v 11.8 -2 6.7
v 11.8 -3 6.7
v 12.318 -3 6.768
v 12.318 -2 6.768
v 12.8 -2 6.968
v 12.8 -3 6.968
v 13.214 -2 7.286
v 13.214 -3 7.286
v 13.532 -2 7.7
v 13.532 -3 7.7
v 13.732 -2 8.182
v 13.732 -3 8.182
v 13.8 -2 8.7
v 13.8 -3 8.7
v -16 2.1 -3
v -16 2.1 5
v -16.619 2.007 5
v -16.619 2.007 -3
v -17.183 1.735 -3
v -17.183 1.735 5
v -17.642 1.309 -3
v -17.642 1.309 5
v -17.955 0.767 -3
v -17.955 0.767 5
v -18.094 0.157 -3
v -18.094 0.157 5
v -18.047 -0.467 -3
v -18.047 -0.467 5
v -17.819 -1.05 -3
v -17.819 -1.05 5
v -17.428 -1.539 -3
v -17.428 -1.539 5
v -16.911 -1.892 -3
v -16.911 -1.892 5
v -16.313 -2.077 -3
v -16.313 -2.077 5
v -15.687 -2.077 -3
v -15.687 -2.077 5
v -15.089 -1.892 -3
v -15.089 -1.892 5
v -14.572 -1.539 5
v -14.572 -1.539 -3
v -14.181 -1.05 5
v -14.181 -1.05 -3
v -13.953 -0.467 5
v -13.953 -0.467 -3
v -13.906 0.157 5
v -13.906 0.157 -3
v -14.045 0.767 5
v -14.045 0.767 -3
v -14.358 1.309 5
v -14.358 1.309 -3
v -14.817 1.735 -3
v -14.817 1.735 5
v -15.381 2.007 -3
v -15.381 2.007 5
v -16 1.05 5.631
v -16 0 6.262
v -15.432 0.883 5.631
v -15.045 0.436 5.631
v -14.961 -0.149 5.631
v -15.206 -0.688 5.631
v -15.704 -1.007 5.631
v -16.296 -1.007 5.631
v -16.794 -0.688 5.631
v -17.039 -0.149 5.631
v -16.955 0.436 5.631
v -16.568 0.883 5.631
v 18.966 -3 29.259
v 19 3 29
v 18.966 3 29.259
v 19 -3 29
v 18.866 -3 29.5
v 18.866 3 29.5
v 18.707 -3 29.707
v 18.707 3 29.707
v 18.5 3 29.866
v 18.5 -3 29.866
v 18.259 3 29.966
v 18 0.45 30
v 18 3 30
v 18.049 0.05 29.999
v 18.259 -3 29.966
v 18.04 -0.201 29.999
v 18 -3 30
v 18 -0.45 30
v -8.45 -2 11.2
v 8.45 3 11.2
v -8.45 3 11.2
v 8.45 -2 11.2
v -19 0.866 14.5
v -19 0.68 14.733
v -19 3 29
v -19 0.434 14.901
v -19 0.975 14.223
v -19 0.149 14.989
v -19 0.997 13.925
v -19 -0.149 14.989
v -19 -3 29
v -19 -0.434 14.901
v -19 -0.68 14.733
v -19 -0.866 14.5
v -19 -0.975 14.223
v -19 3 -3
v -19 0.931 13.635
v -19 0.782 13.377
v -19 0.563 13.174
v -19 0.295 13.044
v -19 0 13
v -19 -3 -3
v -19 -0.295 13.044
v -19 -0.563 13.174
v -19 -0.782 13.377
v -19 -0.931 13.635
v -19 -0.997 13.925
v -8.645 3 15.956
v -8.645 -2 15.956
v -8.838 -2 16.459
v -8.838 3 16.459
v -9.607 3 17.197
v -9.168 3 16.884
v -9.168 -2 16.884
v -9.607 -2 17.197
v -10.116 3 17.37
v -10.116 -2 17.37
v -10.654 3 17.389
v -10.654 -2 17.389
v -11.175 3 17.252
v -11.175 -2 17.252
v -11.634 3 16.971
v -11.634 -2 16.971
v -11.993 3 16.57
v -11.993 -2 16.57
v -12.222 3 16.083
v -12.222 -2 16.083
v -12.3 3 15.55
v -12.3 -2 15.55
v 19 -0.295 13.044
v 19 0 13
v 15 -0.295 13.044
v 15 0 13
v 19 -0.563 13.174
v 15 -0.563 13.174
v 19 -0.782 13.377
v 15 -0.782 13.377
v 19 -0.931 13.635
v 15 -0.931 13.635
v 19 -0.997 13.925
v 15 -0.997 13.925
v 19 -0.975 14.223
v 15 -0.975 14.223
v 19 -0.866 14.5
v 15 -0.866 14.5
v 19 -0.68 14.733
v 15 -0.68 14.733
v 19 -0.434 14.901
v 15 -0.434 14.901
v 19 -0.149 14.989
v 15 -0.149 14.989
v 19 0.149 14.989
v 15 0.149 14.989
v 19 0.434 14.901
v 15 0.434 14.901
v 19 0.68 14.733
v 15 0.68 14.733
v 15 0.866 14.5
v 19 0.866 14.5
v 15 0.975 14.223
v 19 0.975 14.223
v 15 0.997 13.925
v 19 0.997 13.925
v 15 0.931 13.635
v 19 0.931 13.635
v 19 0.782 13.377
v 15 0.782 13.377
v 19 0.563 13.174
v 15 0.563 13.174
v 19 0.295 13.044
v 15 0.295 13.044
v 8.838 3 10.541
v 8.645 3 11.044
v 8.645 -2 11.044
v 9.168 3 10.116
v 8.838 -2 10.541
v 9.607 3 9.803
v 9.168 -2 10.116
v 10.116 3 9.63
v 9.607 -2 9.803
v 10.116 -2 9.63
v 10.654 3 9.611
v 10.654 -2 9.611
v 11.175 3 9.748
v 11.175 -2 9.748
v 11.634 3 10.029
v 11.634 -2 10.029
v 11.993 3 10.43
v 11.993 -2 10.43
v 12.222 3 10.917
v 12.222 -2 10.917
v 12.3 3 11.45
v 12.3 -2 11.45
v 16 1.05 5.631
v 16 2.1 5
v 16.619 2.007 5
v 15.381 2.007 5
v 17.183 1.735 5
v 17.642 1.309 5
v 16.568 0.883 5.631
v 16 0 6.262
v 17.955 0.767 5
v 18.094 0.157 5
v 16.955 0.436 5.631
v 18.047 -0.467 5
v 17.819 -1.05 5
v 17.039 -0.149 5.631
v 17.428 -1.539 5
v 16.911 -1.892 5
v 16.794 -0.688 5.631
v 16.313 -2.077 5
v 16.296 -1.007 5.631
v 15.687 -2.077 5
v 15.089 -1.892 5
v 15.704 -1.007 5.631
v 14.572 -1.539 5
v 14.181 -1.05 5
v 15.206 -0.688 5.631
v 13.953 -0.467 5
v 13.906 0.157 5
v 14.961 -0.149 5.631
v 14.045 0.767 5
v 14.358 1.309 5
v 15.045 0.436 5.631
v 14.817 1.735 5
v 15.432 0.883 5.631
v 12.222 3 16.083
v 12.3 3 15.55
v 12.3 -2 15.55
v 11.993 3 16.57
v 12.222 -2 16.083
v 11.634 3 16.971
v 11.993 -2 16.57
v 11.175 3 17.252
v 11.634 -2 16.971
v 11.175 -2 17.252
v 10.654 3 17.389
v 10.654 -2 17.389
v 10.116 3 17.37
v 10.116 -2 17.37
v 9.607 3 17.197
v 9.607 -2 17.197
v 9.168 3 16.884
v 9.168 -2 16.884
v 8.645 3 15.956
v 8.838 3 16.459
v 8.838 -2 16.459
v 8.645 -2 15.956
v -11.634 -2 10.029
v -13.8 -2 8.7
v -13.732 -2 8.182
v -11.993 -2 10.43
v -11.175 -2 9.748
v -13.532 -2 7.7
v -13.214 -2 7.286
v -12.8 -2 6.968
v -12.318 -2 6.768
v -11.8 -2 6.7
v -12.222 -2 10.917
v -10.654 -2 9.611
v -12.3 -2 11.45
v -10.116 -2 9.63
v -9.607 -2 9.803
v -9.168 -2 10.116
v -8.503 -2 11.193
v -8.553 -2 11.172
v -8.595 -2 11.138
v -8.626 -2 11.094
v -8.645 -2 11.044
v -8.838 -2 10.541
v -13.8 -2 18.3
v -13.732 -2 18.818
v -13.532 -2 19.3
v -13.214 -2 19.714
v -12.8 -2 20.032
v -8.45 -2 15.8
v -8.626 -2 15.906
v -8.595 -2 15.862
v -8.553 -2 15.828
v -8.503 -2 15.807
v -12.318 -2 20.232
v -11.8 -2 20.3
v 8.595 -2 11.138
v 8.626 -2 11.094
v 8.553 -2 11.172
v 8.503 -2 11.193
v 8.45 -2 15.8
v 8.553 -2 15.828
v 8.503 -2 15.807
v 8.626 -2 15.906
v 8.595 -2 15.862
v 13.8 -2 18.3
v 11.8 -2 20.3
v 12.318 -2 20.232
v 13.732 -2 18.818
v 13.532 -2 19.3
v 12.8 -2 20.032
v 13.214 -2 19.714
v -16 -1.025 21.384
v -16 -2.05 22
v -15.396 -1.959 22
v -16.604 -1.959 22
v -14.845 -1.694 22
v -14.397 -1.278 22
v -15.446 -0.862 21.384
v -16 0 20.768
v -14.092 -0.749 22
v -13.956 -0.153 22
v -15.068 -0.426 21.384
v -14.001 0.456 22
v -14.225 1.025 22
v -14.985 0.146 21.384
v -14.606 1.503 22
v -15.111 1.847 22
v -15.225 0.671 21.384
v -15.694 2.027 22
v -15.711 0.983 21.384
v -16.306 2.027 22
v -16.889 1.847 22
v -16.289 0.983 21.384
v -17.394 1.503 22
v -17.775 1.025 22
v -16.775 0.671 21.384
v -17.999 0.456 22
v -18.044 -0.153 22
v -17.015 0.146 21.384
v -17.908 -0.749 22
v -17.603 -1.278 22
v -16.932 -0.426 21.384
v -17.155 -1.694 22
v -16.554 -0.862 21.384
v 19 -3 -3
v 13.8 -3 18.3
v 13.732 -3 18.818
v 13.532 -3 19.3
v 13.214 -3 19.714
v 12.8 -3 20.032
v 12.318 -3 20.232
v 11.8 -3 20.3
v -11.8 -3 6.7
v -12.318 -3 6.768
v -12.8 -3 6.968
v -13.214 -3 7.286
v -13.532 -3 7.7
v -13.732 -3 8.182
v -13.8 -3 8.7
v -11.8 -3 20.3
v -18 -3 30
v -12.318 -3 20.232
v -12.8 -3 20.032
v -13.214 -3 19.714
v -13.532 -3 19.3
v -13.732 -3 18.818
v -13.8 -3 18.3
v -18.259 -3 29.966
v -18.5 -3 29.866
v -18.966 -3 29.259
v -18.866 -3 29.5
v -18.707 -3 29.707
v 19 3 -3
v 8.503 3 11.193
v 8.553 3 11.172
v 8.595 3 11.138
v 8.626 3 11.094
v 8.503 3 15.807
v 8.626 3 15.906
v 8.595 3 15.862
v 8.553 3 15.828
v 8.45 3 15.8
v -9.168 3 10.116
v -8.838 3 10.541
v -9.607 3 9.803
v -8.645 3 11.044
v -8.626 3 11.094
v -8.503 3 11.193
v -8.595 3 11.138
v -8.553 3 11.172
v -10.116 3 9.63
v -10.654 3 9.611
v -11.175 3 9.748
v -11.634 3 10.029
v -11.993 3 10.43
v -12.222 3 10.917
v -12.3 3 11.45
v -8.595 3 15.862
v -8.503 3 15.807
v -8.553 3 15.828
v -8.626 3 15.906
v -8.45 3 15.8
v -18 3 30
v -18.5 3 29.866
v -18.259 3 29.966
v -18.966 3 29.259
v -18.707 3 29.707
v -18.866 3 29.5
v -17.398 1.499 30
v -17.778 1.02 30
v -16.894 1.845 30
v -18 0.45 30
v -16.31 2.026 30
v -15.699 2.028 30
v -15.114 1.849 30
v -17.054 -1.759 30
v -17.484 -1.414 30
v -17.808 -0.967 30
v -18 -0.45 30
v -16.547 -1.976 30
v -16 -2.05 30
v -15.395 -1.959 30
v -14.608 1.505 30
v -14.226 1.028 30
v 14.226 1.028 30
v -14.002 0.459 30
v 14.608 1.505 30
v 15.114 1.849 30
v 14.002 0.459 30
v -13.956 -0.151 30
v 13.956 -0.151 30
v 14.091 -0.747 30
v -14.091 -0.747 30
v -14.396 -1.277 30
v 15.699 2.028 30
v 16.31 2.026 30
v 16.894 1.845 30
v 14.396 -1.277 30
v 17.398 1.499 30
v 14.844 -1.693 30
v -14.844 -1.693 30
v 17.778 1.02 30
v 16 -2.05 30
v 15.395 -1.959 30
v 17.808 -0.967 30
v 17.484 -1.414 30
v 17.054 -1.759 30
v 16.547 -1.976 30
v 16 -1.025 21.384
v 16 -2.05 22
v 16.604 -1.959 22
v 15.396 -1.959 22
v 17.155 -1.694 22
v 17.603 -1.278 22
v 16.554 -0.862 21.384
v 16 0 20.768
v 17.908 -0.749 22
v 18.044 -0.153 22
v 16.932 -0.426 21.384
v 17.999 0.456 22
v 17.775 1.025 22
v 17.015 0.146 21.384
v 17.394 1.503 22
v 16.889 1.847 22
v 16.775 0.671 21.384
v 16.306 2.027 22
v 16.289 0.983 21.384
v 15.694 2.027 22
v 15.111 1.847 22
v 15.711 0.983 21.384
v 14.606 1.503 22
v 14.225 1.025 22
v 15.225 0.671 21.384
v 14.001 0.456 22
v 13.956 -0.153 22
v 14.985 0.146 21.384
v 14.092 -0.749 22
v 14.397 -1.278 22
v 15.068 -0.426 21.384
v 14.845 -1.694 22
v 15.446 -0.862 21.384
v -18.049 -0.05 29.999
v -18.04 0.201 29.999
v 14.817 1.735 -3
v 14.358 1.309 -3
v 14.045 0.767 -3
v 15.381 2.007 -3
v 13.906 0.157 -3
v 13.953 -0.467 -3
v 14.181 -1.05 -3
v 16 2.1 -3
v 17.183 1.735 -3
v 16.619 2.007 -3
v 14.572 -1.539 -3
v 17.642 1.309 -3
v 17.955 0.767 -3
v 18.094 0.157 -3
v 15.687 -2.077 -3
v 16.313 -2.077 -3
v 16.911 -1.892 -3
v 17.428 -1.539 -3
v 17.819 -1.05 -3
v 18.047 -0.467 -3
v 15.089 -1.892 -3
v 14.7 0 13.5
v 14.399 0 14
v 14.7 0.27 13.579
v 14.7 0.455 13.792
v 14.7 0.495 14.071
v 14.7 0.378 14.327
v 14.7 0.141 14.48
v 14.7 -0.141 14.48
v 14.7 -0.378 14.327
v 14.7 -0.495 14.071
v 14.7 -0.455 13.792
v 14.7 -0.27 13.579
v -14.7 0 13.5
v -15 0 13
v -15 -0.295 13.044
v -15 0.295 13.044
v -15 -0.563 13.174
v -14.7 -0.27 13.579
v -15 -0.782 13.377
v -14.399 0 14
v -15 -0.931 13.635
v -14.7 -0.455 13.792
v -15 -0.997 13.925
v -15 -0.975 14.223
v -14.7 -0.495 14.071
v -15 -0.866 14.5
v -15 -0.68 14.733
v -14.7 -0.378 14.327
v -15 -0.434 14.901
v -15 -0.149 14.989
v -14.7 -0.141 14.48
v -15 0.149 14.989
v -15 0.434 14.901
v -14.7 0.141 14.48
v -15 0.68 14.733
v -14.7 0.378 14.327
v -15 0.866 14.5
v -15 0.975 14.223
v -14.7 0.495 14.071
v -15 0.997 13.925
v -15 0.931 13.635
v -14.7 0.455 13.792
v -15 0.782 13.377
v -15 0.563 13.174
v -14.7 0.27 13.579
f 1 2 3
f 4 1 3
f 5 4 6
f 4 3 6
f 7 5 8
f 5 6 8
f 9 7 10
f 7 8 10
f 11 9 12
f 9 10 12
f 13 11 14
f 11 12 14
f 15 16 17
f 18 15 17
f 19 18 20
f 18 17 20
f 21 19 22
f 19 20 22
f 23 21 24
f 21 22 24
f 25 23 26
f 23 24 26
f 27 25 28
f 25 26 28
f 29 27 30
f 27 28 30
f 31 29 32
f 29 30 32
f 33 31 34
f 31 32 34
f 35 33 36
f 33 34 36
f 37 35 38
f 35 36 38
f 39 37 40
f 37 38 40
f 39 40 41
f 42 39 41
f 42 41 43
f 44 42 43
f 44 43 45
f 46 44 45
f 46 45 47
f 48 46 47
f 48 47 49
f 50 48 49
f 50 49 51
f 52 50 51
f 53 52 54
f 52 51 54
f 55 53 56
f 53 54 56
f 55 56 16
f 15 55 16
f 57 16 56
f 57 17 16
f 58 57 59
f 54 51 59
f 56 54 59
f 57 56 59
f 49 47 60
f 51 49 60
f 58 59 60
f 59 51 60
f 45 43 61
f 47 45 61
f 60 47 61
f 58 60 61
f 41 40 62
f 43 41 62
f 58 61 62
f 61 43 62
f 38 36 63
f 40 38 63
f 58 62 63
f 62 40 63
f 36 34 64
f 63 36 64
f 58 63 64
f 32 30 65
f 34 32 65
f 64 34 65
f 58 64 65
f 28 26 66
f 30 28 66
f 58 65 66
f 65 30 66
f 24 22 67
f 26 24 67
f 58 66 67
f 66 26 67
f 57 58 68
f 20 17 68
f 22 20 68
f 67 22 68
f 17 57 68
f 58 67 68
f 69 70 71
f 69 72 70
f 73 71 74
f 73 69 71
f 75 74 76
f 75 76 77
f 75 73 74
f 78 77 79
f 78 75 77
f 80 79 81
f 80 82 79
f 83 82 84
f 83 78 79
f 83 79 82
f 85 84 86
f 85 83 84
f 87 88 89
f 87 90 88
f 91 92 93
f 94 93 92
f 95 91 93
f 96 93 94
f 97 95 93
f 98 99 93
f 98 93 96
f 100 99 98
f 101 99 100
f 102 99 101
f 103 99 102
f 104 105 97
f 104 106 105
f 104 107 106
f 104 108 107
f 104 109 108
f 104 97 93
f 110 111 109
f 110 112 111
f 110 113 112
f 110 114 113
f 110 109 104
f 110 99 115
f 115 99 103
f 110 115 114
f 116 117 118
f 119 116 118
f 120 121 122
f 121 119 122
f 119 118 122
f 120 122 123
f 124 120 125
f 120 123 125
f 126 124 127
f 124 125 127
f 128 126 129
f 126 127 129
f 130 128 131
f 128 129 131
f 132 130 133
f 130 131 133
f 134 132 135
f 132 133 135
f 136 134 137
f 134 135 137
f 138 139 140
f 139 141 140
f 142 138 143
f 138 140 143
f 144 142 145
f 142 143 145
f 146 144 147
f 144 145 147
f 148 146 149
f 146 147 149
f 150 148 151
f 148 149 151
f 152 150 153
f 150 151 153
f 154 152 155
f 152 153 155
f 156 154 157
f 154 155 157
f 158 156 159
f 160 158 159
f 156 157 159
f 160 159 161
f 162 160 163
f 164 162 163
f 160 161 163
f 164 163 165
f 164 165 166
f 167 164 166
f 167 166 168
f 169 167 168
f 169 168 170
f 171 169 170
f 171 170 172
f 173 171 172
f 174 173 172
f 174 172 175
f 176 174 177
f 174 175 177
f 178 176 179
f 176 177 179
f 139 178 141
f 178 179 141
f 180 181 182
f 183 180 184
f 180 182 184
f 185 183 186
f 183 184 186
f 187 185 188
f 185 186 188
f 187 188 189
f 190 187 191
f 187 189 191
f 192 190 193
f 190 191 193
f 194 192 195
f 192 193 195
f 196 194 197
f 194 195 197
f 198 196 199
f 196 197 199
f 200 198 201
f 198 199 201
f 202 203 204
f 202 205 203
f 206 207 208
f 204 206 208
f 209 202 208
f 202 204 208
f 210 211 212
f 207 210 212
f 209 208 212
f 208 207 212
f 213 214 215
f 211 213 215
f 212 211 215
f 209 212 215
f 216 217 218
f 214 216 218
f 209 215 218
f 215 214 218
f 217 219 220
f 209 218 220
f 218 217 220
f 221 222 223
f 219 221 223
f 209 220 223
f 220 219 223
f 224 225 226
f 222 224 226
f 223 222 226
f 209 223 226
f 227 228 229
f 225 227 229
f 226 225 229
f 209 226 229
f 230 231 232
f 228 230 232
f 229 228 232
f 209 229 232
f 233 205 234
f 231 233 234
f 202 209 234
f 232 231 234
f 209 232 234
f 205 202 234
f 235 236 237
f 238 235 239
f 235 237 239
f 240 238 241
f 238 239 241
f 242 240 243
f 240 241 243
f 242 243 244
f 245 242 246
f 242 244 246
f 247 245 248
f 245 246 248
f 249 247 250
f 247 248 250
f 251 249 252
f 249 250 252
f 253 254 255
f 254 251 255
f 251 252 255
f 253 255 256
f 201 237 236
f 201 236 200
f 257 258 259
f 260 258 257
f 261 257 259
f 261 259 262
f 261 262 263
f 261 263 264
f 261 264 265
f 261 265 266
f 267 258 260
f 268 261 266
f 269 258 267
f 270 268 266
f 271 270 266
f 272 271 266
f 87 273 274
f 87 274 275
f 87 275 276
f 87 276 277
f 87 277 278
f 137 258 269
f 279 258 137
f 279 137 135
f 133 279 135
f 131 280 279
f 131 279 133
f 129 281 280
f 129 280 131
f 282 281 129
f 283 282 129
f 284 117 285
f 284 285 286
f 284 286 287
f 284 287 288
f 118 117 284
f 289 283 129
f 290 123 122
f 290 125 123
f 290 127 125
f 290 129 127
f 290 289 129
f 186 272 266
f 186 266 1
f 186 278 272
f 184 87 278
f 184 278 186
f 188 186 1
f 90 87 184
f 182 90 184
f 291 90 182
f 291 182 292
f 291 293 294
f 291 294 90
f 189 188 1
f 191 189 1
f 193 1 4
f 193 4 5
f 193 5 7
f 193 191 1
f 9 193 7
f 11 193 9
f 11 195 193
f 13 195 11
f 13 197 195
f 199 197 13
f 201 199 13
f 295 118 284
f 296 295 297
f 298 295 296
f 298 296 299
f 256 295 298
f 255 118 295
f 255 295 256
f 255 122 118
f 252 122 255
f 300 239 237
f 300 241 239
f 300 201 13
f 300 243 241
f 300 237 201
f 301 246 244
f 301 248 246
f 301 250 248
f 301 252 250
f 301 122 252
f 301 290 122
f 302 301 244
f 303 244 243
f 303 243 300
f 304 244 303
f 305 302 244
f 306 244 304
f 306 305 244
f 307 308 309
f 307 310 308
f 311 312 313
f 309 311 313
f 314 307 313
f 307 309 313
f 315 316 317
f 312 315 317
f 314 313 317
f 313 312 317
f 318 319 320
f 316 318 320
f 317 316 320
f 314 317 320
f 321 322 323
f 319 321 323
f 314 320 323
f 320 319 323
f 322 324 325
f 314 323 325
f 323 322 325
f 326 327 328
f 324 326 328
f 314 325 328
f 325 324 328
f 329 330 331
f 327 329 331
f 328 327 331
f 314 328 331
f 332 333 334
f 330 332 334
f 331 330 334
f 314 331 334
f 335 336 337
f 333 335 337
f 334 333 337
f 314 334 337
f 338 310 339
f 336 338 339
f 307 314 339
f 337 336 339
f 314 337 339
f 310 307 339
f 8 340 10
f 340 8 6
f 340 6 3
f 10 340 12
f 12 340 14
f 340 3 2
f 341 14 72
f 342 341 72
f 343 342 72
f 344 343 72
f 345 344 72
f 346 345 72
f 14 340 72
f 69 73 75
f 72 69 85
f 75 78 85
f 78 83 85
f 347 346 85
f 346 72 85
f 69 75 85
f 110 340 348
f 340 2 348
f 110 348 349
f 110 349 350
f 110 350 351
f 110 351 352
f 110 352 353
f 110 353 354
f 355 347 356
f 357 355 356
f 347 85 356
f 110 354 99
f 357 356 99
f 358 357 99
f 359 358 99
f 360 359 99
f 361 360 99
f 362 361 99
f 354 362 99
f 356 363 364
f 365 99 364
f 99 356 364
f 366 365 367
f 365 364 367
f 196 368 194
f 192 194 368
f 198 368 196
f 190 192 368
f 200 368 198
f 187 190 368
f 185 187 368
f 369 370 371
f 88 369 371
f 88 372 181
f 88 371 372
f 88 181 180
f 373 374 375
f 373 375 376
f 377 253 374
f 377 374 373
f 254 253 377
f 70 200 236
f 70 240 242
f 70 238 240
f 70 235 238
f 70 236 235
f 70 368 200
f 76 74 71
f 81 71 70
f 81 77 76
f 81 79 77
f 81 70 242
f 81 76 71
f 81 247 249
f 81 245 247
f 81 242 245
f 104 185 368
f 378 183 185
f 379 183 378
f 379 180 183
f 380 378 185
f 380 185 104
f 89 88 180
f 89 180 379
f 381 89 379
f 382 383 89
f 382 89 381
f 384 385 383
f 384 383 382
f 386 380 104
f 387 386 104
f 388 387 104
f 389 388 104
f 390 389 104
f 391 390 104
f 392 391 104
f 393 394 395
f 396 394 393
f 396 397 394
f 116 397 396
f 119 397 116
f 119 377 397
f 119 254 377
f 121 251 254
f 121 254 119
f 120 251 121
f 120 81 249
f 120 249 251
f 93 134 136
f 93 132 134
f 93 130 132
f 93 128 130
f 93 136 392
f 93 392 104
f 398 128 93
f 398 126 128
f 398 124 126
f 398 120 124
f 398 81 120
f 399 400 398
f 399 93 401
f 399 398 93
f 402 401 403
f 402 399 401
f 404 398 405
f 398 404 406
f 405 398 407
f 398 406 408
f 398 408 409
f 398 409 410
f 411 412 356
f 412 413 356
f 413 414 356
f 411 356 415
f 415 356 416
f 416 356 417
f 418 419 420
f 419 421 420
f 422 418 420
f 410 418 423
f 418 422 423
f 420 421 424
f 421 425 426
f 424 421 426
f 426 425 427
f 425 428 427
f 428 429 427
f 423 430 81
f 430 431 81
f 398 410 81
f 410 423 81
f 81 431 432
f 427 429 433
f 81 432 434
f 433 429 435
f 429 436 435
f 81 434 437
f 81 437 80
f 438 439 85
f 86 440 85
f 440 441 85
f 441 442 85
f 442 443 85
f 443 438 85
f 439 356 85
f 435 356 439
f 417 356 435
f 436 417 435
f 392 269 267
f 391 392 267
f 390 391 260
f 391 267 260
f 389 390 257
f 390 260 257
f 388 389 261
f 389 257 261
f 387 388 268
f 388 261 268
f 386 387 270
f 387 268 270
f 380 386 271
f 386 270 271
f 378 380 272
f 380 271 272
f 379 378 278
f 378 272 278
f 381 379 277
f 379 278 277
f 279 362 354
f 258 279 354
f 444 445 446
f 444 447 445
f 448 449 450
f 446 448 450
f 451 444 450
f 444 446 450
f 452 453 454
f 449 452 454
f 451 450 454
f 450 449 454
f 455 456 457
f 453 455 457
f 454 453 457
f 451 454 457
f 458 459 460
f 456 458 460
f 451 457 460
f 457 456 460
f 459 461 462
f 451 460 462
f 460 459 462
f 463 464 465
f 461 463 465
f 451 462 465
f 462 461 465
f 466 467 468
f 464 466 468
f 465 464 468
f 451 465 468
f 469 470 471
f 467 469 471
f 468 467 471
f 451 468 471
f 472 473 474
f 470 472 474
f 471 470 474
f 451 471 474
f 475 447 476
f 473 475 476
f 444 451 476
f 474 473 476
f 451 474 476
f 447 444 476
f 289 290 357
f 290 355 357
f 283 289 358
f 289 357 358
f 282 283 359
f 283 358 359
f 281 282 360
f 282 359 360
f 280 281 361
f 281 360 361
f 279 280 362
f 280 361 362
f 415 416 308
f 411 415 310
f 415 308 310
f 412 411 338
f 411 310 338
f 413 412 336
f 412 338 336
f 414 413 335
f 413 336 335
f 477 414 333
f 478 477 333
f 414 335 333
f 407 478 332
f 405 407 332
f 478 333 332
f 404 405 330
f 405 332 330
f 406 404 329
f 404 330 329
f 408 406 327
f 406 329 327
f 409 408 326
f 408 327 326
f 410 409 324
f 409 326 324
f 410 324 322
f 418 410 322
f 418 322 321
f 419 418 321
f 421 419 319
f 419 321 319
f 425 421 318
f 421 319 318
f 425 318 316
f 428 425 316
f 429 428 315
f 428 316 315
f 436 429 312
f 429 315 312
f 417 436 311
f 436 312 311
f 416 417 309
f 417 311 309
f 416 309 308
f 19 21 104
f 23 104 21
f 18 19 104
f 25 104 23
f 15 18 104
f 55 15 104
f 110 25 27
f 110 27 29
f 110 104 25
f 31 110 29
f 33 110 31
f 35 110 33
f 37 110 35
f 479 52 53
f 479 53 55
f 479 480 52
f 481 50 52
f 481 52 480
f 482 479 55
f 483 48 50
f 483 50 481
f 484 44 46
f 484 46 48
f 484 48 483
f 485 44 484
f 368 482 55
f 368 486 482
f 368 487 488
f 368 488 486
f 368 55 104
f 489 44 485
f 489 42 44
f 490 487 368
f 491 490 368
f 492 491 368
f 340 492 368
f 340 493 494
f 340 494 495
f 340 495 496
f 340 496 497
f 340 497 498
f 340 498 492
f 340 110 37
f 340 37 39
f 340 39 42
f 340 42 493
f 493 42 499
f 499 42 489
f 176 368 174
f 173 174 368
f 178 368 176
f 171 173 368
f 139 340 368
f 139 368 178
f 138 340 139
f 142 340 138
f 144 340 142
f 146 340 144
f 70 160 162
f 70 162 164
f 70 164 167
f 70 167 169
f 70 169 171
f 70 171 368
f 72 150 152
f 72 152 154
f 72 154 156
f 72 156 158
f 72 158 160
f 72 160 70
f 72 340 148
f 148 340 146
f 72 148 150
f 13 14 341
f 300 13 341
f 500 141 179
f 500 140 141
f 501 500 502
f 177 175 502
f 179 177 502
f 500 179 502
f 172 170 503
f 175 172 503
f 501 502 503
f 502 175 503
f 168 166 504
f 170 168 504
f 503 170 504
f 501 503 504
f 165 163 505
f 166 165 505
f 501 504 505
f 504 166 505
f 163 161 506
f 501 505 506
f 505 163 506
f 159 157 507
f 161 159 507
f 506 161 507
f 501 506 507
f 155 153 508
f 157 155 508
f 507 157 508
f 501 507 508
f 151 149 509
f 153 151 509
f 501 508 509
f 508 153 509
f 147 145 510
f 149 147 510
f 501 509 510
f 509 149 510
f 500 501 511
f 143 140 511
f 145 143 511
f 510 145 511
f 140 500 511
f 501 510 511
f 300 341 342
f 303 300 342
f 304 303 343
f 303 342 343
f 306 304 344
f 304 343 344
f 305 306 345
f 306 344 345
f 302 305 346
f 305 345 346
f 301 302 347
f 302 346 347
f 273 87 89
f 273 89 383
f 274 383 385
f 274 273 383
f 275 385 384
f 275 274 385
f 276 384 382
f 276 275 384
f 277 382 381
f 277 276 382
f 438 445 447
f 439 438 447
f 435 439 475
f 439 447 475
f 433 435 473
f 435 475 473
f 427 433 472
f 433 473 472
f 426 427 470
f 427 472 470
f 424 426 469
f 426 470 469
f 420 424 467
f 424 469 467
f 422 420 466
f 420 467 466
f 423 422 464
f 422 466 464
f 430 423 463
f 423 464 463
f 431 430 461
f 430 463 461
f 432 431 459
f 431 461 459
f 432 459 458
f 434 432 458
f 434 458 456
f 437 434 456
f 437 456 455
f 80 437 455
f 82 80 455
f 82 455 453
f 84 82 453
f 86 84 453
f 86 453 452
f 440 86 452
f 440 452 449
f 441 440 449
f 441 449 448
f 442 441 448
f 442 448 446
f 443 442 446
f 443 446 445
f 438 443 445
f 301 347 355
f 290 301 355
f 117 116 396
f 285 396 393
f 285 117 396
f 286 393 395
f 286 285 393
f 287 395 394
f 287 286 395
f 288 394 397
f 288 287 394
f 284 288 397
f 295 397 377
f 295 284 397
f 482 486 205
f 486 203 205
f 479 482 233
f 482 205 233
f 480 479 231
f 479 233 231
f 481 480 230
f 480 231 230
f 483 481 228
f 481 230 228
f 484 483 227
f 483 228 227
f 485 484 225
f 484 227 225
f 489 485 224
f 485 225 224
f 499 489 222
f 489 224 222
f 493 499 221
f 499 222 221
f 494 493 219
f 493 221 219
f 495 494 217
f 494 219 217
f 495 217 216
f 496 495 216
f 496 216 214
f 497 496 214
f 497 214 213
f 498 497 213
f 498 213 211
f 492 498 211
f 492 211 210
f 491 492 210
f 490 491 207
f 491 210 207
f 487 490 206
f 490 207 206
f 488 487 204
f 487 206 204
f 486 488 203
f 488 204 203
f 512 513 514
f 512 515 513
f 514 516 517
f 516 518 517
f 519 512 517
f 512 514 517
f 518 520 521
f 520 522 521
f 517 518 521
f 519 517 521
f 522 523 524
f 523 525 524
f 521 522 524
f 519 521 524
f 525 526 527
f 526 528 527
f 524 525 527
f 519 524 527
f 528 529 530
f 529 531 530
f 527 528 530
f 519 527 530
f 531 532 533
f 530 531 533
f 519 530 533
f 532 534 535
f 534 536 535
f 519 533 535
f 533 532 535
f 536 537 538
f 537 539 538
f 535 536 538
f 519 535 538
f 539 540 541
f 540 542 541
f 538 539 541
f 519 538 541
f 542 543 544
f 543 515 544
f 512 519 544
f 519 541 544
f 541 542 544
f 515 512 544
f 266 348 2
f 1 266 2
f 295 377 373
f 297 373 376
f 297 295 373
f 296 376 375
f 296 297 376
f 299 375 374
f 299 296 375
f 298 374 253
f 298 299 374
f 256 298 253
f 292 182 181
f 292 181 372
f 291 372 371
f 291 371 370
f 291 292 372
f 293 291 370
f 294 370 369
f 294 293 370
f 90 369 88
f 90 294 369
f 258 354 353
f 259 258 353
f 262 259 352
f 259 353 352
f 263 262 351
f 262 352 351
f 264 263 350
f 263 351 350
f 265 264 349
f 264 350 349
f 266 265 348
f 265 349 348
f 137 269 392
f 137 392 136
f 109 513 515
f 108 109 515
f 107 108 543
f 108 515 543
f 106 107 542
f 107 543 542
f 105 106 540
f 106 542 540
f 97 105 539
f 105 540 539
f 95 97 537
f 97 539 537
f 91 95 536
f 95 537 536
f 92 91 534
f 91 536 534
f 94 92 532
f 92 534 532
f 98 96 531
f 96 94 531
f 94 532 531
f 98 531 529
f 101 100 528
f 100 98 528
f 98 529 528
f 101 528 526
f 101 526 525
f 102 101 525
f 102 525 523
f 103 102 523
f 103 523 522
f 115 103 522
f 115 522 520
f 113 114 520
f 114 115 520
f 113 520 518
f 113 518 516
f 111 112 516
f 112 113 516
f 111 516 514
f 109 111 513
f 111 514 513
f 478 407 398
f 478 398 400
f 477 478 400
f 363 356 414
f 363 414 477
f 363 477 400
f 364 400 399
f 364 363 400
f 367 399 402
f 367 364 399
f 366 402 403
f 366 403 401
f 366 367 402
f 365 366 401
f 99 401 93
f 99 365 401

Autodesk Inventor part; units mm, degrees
ref_plane "YZ Plane" through (0, 0, 0) normal (1, 0, 0) x (0, 1, 0)
ref_plane "XZ Plane" through (0, 0, 0) normal (0, 1, 0) x (-1, 0, 0)
ref_plane "XY Plane" through (0, 0, 0) normal (0, 0, 1) x (1, 0, 0)
sketch "Skizze1" plane through (0, 0, 0) normal (0, 1, 0) x (-1, 0, 0)
  line L0 (-19, 0) -> (-19, 30)
  line L1 (19, 30) -> (19, 0)
  line L2 (8.85, 11.45) -> (-8.85, 11.45)
  line L3 (-12.05, 11.45) -> (-12.05, 15.55)
  line L4 (-8.85, 15.55) -> (8.85, 15.55)
  line L5 (12.05, 15.55) -> (12.05, 11.45)
  arc A0 (12.05, 15.55) -> (8.85, 15.55) centre (10.45, 15.55) ccw
  arc A1 (8.85, 11.45) -> (12.05, 11.45) centre (10.45, 11.45) ccw
  arc A2 (-8.85, 15.55) -> (-12.05, 15.55) centre (-10.45, 15.55) ccw
  arc A3 (-12.05, 11.45) -> (-8.85, 11.45) centre (-10.45, 11.45) ccw
  line L6 (19, -3) -> (-19, -3)
  line L7 (-19, -3) -> (-19, 0)
  line L8 (19, 0) -> (19, -3)
  line L9 (0, 30) -> (19, 30)
  line L10 (19, 30) -> (-19, 30)
  arc A4 (-12.3, 11.45) -> (-8.617, 11.2) centre (-10.45, 11.45) ccw
  line L11 (-8.617, 11.2) -> (8.617, 11.2)
  arc A5 (8.617, 11.2) -> (12.3, 11.45) centre (10.45, 11.45) ccw
  line L12 (12.3, 11.45) -> (12.3, 15.55)
  arc A6 (12.3, 15.55) -> (8.617, 15.8) centre (10.45, 15.55) ccw
  line L13 (8.617, 15.8) -> (-8.617, 15.8)
  arc A7 (-8.617, 15.8) -> (-12.3, 15.55) centre (-10.45, 15.55) ccw
  line L14 (-12.3, 15.55) -> (-12.3, 11.45)
  line L15 (0, -3) -> (0, 30) construction
  point P0 (0, 13.5)
  point P1 (19, 0)
  point P2 (0, 13.5)
  dimension "d94" = 0.25
extrude "Grundkörper" add sketch "Skizze1" along normal mid plane 6 contours L0 L10 L9 L1 L8 L6 L7
sketch "Skizze10" plane through (19, 3, -3) normal (0, 0, -1) x (-1, 0, 0)
  line L0 (-3.4, -3) -> (41.4, -3)
  line L1 (19, 19.4) -> (19, -25.4)
  point P0 (19, -3)
  point P1 (19, -3)
  point P2 (3, -3)
  point P3 (35, -3)
  dimension "d96" = 32
hole "Fixierung" at (16, 0, -3) at (-16, 0, -3) direction (0, 0, 1) diameter 4.2 depth 8 tip angle 118
fillet "Rundung1" radius 1 2 edges at (-19, 0, 30) (19, 0, 30)
fillet "Rundung2" radius 0.2 4 edges at (-8.617, 0, 15.8) (8.617, 0, 15.8) (8.617, 0, 11.2) (-8.617, 0, 11.2)
sketch "Skizze13" plane through (0, -3, 0) normal (0, -1, 0) x (1, 0, 0)
  line L0 (-8.6611, 15.55) -> (8.6611, 15.55) construction
  line L1 (0, 15.55) -> (0, 11.45) construction
  line L2 (-8.6611, 11.45) -> (8.6611, 11.45) construction
  line L3 (-11.8, 6.7) -> (11.8, 6.7)
  line L4 (13.8, 8.7) -> (13.8, 18.3)
  line L5 (11.8, 20.3) -> (-11.8, 20.3)
  line L6 (-13.8, 18.3) -> (-13.8, 8.7)
  line L7 (-13.8, 6.7) -> (13.8, 20.3) construction
  line L8 (13.8, 6.7) -> (-13.8, 20.3) construction
  arc A0 (-11.8, 20.3) -> (-13.8, 18.3) centre (-11.8, 18.3) ccw
  arc A1 (-13.8, 8.7) -> (-11.8, 6.7) centre (-11.8, 8.7) ccw
  arc A2 (11.8, 6.7) -> (13.8, 8.7) centre (11.8, 8.7) ccw
  arc A3 (13.8, 18.3) -> (11.8, 20.3) centre (11.8, 18.3) ccw
  point P0 (0, 0)
  point P1 (0, 13.5)
  dimension "d125" = 27.6
  dimension "d126" = 13.6
  dimension "d127" = 2
extrude "Tasche" cut sketch "Skizze13" against normal blind 1
sketch "Skizze11" plane through (19, -3, -3) normal (1, 0, 0) x (0, 0, -1)
  point P0 (-7, 3)
  point P1 (-17, 3)
hole "Federn" at (19, 0, 14) direction (-1, 0, 0) diameter 2 depth 4 tip angle 118
mirror "Spiegeln1" about plane through (0, 0, 0) normal (1, 0, 0) of "Federn"
sketch "Skizze12" plane through (-18, 3, 30) normal (0, 0, 1) x (1, 0, 0)
  line L0 (18, -3) -> (2, -3)
  line L1 (18, -3) -> (18, 0)
  line L2 (26.6611, 0) -> (9.3389, 0) projected
  point P0 (34, -3)
  dimension "d117" = 16
hole "Platinenhalterung" at (-16, 0, 30) at (16, 0, 30) direction (0, 0, -1) diameter 4.1 depth 8 tip angle 118
properties part number "Spulenhalter Hinten Einzel" material "Aluminium 6061"
